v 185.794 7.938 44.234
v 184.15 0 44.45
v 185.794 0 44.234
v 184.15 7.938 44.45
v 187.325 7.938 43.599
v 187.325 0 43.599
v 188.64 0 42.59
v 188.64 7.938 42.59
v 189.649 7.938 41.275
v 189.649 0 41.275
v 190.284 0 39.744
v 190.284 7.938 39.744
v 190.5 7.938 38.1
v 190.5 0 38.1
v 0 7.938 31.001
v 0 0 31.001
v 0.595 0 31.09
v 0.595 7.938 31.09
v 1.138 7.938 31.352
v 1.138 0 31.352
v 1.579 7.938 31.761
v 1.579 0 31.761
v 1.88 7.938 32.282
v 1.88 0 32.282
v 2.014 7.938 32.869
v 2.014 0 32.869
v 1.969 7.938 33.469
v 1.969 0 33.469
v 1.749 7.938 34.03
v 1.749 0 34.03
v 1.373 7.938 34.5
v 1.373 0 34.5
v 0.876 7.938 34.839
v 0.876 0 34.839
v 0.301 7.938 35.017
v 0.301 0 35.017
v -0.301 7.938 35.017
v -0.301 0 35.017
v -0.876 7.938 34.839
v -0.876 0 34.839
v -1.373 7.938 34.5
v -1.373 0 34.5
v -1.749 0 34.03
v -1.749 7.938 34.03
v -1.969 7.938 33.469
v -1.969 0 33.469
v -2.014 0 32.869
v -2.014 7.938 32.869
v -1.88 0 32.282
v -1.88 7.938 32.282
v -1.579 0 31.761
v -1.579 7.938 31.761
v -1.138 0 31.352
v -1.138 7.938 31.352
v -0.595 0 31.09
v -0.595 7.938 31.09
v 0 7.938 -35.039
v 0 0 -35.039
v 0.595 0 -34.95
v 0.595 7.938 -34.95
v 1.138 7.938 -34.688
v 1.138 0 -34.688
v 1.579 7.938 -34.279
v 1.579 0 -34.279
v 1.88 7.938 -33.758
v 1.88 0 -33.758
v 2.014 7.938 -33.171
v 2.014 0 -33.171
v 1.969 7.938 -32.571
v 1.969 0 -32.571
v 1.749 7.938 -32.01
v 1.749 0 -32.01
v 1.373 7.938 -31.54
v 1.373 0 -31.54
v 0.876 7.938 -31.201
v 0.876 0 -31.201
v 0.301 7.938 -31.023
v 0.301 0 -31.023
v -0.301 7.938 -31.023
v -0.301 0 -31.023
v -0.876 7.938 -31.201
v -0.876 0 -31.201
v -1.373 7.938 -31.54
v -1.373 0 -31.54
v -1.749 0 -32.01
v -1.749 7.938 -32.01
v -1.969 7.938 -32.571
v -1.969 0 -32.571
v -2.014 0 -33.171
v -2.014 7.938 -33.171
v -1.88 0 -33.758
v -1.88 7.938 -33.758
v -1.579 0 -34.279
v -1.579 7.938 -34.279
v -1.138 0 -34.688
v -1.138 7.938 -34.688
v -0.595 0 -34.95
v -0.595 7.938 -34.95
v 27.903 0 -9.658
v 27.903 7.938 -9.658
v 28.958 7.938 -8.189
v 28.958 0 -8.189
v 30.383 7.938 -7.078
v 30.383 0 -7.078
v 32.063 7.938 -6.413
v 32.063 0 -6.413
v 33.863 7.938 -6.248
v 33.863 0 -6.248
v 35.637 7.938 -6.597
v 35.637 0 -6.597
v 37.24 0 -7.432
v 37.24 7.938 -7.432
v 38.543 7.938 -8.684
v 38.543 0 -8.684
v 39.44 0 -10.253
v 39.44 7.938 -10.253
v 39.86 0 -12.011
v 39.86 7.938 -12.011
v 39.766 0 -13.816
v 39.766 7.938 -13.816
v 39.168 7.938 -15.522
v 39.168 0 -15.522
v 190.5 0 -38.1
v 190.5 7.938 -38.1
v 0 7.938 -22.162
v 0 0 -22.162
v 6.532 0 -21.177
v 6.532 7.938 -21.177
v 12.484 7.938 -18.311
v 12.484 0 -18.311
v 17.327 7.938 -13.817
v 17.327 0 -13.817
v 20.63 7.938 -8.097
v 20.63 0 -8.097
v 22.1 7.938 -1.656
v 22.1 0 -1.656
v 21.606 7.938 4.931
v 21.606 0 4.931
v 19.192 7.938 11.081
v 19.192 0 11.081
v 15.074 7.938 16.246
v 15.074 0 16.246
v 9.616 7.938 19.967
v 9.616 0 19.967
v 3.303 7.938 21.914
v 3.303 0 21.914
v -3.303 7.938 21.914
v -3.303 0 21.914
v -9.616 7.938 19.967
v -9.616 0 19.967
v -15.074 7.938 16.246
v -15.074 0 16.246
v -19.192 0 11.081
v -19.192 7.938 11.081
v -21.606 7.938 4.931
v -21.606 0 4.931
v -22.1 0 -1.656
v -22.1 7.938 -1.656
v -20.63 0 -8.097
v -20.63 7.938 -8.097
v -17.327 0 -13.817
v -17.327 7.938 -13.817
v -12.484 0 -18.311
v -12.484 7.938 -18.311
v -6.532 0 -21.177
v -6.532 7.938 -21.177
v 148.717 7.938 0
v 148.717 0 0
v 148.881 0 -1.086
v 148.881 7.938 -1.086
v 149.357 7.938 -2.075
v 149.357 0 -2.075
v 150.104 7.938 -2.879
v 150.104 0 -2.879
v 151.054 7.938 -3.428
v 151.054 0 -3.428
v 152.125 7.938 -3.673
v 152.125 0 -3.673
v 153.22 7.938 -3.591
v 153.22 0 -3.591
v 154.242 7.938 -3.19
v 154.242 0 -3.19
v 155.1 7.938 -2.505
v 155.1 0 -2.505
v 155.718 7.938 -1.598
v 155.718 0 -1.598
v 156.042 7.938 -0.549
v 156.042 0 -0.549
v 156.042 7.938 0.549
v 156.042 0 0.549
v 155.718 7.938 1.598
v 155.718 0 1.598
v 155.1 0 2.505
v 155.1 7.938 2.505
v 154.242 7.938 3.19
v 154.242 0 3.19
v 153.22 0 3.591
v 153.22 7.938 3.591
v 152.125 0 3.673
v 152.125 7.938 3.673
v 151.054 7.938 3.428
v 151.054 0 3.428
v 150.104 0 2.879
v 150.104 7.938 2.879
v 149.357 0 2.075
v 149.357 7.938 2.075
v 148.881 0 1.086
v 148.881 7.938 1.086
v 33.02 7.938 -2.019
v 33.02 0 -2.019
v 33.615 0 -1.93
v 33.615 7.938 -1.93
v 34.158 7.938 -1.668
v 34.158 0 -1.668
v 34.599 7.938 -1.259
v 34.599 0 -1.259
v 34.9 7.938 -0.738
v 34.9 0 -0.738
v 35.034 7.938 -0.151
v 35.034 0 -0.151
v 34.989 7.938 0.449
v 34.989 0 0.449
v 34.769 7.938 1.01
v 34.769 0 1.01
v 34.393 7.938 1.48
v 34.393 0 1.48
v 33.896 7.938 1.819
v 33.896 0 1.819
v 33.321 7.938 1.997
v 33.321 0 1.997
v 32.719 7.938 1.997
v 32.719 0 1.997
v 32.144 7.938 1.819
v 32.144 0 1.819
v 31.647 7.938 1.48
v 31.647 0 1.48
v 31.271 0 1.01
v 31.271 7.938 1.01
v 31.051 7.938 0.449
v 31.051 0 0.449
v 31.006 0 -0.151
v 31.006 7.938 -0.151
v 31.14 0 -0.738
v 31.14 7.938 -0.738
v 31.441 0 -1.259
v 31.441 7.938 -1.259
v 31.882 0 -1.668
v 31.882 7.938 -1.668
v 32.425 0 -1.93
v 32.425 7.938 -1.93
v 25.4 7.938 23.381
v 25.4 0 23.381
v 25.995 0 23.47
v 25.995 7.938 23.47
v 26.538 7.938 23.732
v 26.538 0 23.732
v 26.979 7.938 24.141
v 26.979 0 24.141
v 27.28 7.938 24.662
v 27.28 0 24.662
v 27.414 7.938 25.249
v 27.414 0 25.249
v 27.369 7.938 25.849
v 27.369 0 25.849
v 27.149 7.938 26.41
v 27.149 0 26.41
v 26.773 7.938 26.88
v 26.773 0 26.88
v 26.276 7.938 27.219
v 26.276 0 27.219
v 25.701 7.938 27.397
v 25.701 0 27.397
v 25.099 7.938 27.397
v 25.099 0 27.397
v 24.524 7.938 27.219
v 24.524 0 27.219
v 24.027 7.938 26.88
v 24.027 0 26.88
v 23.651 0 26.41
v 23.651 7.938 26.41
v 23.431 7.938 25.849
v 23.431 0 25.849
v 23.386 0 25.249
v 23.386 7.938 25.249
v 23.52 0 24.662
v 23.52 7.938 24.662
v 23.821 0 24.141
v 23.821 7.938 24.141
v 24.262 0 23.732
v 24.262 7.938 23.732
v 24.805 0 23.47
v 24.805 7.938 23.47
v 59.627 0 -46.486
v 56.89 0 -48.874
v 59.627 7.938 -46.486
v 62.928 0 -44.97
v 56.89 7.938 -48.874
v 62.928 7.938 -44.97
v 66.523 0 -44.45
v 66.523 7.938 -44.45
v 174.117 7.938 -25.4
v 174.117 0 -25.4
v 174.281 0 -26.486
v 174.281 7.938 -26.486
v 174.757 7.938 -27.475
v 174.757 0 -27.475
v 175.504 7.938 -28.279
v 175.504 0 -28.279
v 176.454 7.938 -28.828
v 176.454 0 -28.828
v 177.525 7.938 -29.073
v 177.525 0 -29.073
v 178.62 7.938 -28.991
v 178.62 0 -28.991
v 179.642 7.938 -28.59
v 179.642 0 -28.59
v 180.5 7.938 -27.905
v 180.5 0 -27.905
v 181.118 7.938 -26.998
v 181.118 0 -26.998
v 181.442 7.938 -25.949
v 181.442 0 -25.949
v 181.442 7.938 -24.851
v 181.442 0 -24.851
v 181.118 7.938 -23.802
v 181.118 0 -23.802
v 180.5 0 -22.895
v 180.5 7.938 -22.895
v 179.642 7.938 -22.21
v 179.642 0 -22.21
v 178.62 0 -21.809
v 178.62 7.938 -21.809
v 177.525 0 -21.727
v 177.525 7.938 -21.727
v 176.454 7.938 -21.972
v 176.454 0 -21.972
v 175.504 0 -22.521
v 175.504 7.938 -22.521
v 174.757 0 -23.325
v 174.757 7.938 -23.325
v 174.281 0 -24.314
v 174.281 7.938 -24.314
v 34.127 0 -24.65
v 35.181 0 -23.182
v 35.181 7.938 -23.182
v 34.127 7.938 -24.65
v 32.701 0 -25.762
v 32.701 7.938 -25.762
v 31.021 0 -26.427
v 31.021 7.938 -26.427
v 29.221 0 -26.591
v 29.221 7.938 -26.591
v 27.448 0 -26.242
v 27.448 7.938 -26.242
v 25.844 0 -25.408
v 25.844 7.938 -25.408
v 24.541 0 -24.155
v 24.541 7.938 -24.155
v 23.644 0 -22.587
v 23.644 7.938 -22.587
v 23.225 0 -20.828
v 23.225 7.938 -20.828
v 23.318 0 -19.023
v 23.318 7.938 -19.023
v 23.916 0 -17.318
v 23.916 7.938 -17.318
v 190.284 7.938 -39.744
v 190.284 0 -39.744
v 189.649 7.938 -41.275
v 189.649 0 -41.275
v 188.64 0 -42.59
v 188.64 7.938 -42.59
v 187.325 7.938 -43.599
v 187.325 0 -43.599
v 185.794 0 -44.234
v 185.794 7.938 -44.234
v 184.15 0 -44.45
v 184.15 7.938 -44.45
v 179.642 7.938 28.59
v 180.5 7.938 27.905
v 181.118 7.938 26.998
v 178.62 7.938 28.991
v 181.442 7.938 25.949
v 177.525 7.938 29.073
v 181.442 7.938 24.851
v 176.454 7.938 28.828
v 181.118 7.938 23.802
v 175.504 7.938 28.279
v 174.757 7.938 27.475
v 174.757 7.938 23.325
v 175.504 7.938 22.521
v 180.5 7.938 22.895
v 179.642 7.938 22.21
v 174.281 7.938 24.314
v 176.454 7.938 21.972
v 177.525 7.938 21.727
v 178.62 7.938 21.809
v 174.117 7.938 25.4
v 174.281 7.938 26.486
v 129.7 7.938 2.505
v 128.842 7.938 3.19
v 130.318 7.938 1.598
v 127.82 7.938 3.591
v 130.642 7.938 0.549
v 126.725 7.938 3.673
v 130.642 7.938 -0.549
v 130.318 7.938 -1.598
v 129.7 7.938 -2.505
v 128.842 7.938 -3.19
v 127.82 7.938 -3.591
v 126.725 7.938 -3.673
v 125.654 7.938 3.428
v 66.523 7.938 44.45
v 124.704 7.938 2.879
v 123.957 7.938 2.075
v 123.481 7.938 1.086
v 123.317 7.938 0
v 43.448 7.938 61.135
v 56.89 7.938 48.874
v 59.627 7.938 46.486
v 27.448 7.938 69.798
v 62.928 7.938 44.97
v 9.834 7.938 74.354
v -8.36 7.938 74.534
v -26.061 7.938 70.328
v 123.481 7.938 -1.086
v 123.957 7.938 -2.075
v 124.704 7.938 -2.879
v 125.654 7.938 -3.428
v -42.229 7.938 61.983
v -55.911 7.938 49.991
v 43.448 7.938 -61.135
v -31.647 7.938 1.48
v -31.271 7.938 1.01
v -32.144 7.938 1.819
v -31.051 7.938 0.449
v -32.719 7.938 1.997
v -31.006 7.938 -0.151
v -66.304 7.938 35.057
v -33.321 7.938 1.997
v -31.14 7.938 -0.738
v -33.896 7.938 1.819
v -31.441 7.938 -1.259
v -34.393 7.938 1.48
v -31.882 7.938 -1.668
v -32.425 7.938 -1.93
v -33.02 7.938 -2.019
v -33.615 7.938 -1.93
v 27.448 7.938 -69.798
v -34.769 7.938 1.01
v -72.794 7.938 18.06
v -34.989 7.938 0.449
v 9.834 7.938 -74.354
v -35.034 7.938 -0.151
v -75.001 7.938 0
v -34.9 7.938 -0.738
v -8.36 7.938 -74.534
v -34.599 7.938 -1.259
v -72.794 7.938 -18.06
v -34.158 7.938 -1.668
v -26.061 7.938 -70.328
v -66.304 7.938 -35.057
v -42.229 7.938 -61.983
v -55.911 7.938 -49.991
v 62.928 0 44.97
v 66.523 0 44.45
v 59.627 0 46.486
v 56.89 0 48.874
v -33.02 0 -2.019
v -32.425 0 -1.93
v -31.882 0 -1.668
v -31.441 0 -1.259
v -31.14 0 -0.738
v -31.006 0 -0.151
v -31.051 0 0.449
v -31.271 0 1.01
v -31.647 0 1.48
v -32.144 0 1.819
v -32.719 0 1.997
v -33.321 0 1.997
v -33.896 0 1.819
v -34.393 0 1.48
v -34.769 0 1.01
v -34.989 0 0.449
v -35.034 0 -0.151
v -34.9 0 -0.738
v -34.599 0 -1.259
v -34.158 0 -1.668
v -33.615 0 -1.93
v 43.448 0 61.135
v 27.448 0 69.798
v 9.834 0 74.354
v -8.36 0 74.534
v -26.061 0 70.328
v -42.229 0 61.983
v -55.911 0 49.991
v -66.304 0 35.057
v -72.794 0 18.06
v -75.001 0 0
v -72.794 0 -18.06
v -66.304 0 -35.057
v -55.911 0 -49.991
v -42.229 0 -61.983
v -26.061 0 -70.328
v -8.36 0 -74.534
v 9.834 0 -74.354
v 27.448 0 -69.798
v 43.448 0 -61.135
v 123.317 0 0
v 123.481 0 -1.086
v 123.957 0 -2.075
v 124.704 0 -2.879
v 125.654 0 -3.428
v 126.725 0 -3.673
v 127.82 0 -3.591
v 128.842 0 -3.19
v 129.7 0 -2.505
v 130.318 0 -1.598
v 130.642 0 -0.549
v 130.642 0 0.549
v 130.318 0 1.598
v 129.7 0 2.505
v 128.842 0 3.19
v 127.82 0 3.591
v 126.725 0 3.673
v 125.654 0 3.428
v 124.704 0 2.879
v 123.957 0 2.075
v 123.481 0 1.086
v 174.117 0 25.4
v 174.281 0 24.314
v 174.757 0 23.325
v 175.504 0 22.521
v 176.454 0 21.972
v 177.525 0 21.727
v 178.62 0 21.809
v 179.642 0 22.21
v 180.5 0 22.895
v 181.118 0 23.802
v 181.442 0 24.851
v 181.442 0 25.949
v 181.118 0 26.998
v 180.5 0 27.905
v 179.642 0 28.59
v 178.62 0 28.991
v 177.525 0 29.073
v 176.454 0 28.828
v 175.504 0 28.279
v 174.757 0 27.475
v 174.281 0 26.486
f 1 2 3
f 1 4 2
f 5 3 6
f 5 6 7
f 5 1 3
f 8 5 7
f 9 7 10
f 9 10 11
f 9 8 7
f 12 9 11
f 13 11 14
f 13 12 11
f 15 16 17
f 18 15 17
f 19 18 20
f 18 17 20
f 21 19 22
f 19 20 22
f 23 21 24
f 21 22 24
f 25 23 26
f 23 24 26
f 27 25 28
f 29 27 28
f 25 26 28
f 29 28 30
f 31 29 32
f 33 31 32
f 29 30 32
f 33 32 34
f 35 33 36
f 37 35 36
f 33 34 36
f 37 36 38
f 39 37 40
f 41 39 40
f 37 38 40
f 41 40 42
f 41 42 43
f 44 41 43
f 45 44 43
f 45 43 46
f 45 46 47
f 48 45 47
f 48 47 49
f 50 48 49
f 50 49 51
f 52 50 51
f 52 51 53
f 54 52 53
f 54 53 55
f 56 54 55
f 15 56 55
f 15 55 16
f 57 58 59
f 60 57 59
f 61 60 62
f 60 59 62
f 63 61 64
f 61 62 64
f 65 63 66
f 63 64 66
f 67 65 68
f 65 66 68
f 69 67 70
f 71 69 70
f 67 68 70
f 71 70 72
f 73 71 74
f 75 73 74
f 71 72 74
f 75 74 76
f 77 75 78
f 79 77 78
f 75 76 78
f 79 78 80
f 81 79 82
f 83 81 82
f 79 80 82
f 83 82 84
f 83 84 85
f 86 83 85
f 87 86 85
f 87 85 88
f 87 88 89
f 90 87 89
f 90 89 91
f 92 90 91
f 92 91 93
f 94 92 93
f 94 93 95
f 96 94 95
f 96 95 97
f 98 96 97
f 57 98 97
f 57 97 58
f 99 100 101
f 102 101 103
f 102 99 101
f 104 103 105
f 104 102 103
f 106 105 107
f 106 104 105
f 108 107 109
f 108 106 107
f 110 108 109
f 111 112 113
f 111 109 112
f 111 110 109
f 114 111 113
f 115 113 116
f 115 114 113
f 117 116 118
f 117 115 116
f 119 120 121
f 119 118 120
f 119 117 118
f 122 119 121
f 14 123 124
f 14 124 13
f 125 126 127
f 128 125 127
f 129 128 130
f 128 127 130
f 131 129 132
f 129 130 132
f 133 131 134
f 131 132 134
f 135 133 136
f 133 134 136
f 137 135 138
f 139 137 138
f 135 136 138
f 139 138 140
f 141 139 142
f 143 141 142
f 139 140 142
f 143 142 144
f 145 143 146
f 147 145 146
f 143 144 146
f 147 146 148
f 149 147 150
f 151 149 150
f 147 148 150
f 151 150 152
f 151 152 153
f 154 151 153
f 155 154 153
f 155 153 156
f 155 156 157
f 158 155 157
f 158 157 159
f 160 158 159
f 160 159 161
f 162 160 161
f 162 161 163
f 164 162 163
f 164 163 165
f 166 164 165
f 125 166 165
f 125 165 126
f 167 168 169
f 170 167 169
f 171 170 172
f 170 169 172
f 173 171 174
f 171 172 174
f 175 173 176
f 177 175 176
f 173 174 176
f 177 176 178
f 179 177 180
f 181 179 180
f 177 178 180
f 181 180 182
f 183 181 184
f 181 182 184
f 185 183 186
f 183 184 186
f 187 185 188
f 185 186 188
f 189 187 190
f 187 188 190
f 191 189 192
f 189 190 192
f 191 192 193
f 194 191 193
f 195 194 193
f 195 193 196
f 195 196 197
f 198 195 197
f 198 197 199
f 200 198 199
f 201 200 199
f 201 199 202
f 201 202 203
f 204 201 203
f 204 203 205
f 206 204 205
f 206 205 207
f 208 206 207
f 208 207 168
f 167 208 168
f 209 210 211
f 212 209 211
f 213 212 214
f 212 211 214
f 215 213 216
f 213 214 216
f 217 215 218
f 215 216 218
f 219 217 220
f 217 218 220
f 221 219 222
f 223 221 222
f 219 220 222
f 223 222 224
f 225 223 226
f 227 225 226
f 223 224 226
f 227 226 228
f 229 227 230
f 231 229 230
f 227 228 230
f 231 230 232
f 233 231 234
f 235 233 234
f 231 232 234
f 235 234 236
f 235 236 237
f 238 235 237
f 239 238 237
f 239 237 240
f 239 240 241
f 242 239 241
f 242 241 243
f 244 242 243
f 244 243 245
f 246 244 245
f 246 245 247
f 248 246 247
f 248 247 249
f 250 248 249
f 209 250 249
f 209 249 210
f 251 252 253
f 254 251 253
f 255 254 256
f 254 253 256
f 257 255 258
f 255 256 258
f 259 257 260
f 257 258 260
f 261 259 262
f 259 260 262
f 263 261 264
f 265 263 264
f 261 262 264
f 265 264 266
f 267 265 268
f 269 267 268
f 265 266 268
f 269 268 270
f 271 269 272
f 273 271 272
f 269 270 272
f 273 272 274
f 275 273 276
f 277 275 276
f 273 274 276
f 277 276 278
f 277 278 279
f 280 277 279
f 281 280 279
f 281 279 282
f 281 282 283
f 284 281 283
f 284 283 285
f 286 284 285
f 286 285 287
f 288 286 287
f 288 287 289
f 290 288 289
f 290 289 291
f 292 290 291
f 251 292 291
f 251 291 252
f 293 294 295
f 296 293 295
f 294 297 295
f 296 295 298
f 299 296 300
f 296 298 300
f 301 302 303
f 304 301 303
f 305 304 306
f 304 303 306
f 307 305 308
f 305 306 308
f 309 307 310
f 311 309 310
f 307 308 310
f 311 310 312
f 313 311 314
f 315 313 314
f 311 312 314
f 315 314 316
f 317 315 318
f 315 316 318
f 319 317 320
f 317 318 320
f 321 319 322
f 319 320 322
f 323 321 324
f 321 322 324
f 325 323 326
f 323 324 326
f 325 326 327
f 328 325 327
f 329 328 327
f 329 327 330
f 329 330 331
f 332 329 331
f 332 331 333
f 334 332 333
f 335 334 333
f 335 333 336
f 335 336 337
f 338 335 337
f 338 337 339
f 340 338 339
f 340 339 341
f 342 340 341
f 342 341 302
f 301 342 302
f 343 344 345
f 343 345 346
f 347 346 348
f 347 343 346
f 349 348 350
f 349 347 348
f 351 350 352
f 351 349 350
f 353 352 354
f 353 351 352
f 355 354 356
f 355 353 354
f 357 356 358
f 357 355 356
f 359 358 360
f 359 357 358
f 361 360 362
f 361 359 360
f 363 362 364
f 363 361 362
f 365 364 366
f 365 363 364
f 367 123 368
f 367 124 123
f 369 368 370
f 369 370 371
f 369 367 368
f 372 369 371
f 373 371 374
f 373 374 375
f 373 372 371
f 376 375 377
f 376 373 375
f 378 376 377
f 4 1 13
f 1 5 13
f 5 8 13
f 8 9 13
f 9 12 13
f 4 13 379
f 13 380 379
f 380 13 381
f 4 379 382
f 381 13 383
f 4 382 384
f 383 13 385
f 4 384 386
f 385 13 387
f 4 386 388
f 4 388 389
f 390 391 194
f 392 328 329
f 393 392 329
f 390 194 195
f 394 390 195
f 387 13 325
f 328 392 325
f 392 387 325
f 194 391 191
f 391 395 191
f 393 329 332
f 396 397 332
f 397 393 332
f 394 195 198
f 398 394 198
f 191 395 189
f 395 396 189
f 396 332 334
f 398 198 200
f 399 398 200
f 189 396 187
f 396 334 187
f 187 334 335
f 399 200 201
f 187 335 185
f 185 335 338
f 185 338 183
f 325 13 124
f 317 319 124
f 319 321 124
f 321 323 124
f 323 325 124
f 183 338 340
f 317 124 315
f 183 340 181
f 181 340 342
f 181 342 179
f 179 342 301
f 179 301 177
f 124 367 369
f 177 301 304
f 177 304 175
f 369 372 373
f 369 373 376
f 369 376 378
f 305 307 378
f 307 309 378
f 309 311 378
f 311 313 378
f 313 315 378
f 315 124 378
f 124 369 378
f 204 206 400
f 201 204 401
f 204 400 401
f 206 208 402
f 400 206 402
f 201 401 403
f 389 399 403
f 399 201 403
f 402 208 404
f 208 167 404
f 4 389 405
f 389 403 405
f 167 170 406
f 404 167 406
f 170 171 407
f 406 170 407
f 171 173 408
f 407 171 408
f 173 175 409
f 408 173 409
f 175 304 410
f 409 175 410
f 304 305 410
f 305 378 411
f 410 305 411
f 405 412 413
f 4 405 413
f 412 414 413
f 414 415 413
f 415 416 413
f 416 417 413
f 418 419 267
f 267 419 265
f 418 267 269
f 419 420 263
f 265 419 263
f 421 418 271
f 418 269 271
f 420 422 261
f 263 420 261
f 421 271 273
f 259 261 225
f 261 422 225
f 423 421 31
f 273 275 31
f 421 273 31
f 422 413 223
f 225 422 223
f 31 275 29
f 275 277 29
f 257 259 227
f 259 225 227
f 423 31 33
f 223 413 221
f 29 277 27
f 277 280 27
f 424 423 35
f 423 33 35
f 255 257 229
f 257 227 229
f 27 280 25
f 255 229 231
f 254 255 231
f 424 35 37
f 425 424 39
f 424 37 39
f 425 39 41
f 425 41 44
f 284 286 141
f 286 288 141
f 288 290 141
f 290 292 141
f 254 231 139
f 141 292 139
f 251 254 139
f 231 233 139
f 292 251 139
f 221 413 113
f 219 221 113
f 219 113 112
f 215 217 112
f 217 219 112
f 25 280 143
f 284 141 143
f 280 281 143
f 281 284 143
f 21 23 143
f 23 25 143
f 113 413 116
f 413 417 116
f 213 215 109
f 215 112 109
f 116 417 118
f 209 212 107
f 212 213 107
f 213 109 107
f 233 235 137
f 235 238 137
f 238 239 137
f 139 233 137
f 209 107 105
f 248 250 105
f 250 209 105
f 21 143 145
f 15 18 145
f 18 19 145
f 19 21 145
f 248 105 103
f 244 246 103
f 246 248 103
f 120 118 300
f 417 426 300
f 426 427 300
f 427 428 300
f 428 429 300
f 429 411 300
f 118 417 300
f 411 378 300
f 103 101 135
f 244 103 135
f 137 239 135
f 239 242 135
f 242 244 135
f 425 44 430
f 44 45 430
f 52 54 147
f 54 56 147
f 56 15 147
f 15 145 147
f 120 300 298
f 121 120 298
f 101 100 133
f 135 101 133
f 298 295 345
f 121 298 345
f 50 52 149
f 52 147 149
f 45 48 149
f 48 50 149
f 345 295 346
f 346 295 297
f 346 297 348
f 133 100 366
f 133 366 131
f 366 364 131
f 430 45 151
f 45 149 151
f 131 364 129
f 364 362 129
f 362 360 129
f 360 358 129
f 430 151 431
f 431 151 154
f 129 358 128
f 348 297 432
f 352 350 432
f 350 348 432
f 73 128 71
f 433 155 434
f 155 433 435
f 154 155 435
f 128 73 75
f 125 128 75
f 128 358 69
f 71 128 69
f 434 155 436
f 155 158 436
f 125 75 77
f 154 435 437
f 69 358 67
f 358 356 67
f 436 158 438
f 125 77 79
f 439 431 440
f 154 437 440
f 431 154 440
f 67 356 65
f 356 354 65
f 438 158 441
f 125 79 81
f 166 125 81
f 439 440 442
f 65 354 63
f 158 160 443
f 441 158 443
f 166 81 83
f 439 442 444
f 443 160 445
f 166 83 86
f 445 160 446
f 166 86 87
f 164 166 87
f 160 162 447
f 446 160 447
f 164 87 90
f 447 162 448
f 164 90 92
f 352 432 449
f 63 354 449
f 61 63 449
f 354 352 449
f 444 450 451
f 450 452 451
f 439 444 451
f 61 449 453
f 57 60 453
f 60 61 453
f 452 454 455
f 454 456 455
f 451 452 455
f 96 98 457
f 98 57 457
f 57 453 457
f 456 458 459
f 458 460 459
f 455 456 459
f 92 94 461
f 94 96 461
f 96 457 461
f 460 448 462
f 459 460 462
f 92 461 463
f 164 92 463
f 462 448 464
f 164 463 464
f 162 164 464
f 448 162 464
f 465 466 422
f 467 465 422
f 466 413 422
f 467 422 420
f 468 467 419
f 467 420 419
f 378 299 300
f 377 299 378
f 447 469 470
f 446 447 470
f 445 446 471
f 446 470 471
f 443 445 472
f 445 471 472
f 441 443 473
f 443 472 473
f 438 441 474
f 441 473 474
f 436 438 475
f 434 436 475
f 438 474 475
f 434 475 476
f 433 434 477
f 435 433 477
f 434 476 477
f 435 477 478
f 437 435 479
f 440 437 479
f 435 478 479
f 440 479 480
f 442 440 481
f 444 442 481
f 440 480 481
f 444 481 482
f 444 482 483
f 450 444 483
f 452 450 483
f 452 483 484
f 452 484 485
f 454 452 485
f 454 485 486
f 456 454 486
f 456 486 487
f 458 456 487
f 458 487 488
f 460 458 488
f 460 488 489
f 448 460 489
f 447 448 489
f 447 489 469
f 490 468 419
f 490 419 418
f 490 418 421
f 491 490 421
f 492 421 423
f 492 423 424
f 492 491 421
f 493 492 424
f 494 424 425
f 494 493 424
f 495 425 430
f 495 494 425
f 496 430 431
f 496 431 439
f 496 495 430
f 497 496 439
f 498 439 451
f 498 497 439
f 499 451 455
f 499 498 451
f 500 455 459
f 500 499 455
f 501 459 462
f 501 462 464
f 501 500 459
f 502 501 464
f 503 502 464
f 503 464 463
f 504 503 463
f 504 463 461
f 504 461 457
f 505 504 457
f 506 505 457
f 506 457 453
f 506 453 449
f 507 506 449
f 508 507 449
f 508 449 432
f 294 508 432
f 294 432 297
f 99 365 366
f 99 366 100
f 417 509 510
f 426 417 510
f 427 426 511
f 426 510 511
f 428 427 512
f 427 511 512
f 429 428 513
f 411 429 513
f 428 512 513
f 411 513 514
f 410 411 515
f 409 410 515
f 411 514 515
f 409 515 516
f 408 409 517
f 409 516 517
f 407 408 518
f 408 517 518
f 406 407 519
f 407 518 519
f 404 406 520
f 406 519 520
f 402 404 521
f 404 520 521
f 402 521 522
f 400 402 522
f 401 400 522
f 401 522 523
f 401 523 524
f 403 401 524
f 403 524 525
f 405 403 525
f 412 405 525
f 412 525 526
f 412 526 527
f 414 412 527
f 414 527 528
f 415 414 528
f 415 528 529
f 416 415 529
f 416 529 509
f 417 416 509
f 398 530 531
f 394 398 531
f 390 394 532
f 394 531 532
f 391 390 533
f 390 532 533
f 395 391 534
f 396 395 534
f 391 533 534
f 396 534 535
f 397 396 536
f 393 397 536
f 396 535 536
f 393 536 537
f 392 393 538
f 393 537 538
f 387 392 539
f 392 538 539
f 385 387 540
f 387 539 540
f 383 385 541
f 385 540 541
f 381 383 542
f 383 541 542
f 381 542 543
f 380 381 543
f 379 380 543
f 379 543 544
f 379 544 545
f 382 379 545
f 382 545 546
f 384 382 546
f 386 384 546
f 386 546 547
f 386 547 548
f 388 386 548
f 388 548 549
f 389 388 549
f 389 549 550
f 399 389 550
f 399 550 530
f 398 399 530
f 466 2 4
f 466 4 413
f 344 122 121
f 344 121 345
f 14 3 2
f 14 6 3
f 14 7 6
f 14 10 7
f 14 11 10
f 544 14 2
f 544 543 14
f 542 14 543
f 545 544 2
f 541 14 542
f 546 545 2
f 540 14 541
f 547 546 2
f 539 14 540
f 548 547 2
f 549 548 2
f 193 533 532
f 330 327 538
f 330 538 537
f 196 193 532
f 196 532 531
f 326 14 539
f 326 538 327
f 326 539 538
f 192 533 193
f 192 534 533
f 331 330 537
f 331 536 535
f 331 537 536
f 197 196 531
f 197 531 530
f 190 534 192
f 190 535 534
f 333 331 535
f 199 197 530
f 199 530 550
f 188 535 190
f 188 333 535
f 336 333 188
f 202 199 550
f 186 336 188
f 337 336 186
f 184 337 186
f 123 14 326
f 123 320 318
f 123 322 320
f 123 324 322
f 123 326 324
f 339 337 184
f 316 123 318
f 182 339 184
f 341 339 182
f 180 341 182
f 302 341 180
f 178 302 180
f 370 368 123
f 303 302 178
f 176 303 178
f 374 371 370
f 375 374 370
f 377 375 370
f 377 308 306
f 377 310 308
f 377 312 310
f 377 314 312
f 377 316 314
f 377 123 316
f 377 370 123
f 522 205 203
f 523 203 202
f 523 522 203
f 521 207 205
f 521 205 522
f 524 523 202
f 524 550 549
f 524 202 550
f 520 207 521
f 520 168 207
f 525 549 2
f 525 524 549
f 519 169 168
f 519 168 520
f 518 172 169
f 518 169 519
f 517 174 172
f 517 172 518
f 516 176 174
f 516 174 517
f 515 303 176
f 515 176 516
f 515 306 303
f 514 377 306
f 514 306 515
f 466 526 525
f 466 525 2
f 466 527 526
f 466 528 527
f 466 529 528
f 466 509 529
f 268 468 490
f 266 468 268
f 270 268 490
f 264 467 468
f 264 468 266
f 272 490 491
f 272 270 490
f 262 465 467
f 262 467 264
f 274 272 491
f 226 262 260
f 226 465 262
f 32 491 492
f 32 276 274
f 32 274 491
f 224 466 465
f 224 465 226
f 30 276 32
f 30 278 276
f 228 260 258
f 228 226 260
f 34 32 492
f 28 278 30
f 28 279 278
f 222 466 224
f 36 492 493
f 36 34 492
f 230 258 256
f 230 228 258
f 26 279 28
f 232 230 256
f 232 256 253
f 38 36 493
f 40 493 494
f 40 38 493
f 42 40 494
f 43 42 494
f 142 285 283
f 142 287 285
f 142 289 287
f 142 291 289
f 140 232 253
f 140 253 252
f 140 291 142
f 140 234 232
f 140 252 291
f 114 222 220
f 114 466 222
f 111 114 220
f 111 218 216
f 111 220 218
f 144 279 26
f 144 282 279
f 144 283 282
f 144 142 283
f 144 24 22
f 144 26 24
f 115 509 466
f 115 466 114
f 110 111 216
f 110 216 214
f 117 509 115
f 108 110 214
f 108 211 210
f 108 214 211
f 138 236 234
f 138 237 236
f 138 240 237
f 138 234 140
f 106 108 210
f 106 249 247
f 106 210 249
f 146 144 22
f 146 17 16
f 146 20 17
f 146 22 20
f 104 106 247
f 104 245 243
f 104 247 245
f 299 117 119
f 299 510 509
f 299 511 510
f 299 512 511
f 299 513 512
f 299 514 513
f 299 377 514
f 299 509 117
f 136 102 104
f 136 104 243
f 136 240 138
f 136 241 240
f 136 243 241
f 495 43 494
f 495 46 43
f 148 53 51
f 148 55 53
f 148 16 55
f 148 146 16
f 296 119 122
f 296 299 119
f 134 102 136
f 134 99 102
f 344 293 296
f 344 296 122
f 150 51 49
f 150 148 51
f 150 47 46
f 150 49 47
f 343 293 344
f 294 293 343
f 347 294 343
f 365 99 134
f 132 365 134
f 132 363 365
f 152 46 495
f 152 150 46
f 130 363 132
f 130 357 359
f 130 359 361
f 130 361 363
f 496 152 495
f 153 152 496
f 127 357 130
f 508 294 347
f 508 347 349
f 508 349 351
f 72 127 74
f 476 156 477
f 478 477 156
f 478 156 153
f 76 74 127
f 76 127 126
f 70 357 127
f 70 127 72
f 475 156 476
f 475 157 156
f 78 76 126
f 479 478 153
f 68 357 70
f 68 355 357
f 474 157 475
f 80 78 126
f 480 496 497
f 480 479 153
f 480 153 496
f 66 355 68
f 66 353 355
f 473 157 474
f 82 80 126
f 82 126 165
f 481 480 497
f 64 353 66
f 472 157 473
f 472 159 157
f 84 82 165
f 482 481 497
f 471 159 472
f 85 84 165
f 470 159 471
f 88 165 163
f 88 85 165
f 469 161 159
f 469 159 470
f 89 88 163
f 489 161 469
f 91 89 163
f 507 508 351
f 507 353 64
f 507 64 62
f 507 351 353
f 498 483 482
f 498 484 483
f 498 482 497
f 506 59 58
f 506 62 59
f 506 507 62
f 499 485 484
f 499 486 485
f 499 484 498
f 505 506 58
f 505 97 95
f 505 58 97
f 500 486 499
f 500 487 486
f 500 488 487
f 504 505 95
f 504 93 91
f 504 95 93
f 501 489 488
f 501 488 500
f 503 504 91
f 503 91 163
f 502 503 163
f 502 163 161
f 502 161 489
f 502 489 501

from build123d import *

# Parameters (mm, degrees)
BOSS_EXTRUDE1_DEPTH     = 7.9375
SKETCH23_R              = 22.1615
SKETCH23_R_2            = 2.0193
CUT_EXTRUDE4_DEPTH      = 205.886363401
L_0_29_DIAMETER_HOLE1_D = 7.366
FILLET2_R               = 6.35
FILLET3_R               = 12.7


with BuildPart() as part:
    # Sketch1 → Boss-Extrude1 (new body)
    with BuildSketch(Plane(origin=(0, 0, 0), x_dir=(1, 0, 0), z_dir=(0, 1, 0))):
        with BuildLine():
            Line((190.5, -44.45), (60.409978491, -44.45))
            ThreePointArc((60.409978491, -44.45), (-75.00112, 0), (60.409978491, 44.45))
            Line((60.409978491, 44.45), (190.5, 44.45))
            Line((190.5, 44.45), (190.5, -44.45))
        make_face()
    extrude(amount=BOSS_EXTRUDE1_DEPTH)

    # Sketch23 → Cut-Extrude4 (cut, through all)
    with BuildSketch(Plane.XZ):
        with Locations(Location((0, 0, 0), (0, 0, 270))):
            Circle(SKETCH23_R)
        with Locations(Location((0, 33.02, 0), (0, 0, 270))):
            Circle(SKETCH23_R_2)
        with Locations(Location((33.02, 0, 0), (0, 0, 270))):
            Circle(SKETCH23_R_2)
        with Locations(Location((0, -33.02, 0), (0, 0, 270))):
            Circle(SKETCH23_R_2)
        with Locations(Location((-33.02, 0, 0), (0, 0, 270))):
            Circle(SKETCH23_R_2)
        with Locations(Location((25.4, 25.4, 0), (0, 0, 270))):
            Circle(SKETCH23_R_2)
        with BuildLine():
            Line((23.915755925, -17.31778977), (27.903416949, -9.657564215))
            ThreePointArc((27.903416949, -9.657564215), (36.468039434, -6.957149118), (39.16845453, -15.521771603))
            Line((39.16845453, -15.521771603), (35.180793507, -23.181997158))
            ThreePointArc((35.180793507, -23.181997158), (26.616171022, -25.882412255), (23.915755925, -17.31778977))
        make_face()
    extrude(amount=-CUT_EXTRUDE4_DEPTH, mode=Mode.SUBTRACT)

    # L (0.29) Diameter Hole1 (through all)
    with Locations(Plane(origin=(0, 7.9375, 0), x_dir=(1, 0, 0), z_dir=(0, 1, 0))):
        with Locations((177.8, 25.4), (177.8, -25.4), (152.4, 0), (127, 0)):
            Hole(L_0_29_DIAMETER_HOLE1_D / 2)

    # Fillet2
    fillet2_edges = [part.edges().sort_by_distance(p)[0] for p in [
        (190.5, 3.96875, -44.45),
        (190.5, 3.96875, 44.45),
    ]]
    fillet(fillet2_edges, radius=FILLET2_R)

    # Fillet3
    fillet3_edges = [part.edges().sort_by_distance(p)[0] for p in [
        (60.409978491, 3.96875, -44.45),
        (60.409978491, 3.96875, 44.45),
    ]]
    fillet(fillet3_edges, radius=FILLET3_R)


solid = part.part
